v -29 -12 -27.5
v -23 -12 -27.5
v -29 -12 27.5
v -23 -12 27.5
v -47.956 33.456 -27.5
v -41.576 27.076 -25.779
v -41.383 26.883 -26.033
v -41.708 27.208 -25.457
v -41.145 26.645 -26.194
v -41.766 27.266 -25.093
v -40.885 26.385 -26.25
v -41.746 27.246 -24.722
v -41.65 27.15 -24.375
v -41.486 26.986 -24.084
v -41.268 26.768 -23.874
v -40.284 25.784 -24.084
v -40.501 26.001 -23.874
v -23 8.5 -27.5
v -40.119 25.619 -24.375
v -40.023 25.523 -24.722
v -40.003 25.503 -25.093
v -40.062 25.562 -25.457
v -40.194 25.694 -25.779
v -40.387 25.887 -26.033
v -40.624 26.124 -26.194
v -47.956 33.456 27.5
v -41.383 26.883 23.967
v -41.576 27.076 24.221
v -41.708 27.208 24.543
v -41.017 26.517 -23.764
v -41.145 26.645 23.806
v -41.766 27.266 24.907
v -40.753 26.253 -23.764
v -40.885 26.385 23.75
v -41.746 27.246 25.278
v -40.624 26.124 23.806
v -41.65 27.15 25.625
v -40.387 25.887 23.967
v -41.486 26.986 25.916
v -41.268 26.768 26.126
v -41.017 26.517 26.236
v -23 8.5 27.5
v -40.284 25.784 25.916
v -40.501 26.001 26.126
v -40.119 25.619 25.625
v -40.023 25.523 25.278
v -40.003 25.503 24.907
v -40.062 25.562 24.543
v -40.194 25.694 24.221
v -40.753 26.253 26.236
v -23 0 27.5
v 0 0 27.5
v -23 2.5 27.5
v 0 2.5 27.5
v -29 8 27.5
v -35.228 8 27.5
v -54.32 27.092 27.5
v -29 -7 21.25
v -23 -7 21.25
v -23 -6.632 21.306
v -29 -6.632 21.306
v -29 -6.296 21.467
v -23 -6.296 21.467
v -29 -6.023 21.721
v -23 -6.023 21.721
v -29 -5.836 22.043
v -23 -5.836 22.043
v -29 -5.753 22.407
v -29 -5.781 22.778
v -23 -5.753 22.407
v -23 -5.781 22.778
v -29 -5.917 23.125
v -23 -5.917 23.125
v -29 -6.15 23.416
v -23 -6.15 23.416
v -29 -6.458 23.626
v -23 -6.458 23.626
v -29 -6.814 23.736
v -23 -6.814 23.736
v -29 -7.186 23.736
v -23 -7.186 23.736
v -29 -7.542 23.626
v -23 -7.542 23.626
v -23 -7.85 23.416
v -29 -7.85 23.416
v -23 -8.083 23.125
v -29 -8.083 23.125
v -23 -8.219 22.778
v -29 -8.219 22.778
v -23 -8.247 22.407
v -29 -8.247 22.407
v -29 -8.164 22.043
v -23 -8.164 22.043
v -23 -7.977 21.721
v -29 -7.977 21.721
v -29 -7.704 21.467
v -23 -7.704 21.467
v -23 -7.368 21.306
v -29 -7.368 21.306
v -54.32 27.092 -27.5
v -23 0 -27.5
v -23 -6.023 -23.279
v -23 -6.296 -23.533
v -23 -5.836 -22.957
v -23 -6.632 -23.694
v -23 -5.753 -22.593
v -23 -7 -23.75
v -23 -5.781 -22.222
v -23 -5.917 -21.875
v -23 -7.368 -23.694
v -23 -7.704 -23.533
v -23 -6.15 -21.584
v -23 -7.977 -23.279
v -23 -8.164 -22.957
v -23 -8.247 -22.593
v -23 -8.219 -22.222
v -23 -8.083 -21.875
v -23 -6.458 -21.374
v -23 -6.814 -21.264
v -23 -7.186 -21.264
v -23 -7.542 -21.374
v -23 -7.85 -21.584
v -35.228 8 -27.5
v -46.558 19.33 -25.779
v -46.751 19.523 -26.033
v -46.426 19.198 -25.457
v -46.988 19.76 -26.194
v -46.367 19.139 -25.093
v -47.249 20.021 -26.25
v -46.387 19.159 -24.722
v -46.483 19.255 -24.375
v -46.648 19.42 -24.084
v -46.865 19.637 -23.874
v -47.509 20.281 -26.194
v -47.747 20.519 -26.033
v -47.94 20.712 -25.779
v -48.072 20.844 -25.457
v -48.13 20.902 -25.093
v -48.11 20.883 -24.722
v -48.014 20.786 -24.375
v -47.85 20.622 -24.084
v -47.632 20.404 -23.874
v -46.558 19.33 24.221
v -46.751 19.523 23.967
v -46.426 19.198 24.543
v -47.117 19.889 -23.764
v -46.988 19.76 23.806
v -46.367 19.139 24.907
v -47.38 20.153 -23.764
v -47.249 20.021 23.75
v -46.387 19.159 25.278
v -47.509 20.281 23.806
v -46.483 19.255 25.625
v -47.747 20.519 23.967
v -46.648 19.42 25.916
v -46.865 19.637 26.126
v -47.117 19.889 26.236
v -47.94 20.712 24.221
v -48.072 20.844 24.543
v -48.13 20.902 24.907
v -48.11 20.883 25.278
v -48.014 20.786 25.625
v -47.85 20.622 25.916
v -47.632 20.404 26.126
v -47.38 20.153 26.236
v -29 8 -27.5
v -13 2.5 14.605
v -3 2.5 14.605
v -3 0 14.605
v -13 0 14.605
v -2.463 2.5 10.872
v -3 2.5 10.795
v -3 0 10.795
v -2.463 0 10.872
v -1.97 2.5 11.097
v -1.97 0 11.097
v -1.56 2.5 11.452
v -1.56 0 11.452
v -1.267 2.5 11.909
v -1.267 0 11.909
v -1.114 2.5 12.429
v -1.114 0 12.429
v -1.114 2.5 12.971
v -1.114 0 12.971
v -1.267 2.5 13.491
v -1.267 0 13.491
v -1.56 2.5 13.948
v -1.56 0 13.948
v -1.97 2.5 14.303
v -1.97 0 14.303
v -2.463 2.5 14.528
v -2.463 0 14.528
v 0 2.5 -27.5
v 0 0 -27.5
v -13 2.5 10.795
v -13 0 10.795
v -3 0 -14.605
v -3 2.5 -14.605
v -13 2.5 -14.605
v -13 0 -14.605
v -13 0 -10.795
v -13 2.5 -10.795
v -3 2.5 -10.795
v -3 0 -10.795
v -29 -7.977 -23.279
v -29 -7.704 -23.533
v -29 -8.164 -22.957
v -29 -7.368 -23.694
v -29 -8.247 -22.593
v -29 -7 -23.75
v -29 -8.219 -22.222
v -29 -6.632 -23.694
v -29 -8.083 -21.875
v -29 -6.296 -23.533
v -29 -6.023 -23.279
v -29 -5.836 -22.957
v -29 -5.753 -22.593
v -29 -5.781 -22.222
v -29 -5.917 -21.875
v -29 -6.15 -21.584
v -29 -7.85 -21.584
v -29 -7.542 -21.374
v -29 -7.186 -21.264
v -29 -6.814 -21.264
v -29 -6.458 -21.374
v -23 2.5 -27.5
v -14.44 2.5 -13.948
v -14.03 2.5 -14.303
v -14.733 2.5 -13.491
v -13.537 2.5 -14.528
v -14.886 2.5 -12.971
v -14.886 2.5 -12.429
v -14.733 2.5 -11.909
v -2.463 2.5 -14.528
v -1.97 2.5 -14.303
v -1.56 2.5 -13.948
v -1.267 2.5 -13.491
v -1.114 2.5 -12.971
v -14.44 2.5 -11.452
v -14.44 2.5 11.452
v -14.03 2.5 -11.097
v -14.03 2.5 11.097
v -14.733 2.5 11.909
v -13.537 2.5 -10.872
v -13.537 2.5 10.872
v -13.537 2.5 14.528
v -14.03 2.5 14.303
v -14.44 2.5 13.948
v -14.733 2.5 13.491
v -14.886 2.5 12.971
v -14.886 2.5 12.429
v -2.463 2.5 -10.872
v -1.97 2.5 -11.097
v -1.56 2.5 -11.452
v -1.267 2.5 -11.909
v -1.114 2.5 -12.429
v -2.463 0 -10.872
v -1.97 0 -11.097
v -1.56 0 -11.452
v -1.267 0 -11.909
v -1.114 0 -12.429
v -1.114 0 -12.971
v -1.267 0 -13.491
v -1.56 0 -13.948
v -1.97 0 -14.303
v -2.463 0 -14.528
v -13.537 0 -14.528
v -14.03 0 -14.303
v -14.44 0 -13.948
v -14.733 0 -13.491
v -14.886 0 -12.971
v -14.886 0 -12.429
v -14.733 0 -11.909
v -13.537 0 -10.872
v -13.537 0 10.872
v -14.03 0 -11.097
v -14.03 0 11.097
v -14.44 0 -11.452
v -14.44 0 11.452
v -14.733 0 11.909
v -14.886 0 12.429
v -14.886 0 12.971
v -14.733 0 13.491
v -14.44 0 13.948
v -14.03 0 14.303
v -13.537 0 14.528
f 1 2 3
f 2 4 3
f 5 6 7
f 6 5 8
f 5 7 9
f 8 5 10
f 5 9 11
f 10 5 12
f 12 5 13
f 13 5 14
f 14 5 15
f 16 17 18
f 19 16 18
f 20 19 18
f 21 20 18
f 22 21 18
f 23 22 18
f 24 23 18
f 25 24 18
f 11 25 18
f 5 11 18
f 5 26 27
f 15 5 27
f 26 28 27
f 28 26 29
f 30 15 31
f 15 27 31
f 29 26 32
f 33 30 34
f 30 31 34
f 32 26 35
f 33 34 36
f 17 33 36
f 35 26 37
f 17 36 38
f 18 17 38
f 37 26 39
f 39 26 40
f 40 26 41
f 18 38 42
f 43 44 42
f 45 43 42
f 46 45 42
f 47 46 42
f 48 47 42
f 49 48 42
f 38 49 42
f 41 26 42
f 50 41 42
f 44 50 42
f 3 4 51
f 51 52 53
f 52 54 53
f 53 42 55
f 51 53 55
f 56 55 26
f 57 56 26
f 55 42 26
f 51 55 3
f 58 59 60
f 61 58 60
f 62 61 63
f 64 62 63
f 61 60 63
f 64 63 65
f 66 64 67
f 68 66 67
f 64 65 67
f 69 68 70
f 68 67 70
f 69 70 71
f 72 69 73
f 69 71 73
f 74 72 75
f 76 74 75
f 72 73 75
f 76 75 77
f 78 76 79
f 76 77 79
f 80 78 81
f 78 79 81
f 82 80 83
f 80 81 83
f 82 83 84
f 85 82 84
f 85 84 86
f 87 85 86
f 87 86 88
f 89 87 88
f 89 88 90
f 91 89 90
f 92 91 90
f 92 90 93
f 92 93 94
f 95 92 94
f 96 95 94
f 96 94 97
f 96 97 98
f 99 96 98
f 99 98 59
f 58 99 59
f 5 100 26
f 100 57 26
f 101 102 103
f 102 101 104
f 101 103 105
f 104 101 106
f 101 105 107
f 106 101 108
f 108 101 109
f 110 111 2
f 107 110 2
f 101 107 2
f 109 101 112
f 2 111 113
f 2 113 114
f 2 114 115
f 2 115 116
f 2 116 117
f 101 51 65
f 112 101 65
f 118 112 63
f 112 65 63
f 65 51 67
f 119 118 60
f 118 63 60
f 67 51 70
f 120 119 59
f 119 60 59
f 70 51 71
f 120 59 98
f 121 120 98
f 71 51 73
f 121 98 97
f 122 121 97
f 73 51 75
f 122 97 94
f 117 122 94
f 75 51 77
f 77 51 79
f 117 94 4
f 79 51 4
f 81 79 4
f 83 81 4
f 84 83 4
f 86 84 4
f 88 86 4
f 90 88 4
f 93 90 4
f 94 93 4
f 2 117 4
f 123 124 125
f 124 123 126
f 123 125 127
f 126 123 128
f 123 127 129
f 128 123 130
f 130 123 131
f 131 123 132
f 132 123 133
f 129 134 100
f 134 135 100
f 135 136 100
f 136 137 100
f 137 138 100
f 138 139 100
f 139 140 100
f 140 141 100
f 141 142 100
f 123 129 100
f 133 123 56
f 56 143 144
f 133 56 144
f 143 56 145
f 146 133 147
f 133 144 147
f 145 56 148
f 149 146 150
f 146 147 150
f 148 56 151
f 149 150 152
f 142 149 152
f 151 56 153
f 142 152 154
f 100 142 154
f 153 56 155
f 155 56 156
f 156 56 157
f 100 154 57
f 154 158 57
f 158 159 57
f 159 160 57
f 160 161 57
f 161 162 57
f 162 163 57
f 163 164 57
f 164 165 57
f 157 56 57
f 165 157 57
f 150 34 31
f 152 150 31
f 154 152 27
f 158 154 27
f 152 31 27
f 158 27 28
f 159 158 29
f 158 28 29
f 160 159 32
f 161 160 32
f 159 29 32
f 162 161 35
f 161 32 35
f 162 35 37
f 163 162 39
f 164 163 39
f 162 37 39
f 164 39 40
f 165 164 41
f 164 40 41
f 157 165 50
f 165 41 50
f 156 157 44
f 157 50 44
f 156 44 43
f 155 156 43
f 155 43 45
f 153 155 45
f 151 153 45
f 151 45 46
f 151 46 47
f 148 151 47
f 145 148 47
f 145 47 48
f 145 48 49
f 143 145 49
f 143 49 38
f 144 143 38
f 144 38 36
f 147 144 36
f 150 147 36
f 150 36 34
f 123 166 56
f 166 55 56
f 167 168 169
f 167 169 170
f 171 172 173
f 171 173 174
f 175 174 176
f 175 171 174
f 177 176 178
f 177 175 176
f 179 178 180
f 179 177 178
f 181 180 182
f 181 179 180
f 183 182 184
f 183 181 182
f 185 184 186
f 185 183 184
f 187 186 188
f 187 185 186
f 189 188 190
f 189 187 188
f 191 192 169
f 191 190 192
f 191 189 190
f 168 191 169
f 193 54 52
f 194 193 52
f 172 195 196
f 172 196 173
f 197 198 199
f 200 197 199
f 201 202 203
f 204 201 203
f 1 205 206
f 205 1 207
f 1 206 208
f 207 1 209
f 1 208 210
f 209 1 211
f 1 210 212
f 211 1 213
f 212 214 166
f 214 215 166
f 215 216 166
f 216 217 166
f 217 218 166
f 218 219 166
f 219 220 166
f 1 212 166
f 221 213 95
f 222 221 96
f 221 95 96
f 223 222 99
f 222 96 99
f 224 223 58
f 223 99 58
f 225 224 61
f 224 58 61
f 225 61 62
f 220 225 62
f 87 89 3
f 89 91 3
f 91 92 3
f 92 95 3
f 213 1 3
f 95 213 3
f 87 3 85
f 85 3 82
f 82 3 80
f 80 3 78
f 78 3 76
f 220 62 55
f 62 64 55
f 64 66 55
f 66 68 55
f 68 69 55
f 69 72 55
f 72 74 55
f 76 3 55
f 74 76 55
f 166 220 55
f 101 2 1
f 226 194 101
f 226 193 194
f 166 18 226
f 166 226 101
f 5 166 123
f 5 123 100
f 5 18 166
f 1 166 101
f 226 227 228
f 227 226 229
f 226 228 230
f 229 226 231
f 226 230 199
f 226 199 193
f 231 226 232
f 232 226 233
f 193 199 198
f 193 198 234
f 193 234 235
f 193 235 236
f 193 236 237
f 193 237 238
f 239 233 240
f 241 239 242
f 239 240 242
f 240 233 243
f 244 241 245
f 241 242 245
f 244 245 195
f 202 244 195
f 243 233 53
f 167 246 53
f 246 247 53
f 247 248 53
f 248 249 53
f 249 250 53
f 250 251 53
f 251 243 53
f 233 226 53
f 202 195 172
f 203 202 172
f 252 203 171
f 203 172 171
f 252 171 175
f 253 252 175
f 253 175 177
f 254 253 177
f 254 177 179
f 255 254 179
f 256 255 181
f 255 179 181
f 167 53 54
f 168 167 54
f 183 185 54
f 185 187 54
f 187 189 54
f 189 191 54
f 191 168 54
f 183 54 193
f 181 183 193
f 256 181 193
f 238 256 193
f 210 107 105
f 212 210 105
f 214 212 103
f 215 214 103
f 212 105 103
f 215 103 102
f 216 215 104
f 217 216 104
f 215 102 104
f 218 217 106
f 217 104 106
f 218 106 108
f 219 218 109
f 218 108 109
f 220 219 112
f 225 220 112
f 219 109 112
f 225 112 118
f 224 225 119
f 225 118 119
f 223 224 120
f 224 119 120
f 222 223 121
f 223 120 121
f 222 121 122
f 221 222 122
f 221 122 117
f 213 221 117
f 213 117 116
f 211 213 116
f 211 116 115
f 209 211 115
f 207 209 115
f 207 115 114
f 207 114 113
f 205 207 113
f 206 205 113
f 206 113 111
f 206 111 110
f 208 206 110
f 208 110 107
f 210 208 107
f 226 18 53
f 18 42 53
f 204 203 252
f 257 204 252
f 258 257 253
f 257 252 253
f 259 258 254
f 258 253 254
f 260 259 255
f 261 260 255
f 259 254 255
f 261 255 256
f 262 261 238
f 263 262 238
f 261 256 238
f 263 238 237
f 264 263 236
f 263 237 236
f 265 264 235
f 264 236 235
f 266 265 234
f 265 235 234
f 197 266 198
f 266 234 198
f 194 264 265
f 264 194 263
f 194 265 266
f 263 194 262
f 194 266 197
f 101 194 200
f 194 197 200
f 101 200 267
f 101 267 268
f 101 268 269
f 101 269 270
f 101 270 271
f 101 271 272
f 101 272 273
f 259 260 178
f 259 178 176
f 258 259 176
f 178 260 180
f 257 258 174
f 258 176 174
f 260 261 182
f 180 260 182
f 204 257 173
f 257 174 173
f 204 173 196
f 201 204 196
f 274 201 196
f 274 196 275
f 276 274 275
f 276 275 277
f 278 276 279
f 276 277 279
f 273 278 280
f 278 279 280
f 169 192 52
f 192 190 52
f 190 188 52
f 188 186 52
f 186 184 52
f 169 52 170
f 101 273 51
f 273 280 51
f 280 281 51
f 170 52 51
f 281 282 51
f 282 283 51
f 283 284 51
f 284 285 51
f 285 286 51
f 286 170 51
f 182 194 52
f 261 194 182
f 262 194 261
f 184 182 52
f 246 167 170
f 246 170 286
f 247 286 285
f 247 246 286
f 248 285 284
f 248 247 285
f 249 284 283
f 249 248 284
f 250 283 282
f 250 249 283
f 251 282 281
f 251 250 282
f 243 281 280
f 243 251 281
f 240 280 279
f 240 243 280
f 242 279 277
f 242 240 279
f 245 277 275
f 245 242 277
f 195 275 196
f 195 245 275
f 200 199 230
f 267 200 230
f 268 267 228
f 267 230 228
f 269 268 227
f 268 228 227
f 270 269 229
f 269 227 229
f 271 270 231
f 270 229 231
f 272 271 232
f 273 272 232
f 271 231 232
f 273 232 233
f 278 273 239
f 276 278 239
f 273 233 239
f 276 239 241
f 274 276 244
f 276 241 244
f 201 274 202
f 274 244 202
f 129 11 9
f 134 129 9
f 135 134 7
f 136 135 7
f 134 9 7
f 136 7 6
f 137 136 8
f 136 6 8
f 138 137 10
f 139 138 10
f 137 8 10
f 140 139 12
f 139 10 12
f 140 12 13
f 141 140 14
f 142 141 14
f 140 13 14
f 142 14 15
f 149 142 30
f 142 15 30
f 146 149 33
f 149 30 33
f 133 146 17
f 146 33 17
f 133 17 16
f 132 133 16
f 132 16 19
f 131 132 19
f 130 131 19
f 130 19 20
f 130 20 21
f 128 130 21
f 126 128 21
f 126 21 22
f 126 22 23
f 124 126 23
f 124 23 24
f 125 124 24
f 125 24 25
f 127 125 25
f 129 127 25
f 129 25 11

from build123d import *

# Parameters (mm, degrees)
BOSS_EXTRUDE1_DEPTH = 27.5
CUT_EXTRUDE2_REACH  = 16.5
CUT_EXTRUDE3_REACH  = 33.32
SKETCH4_R           = 1.25
CUT_EXTRUDE4_REACH  = 38.642
SKETCH5_R           = 1.25


with BuildPart() as part:
    # Sketch1 → Boss-Extrude1 (new body, symmetric)
    with BuildSketch(Plane.XY):
        Polygon((0, 0), (-23, 0), (-23, -12), (-29, -12), (-29, 8), (-35.227922061, 8), (-54.319805153, 27.091883092), (-47.955844123, 33.455844123), (-23, 8.5), (-23, 2.5), (0, 2.5), align=None)
    extrude(amount=BOSS_EXTRUDE1_DEPTH, both=True)

    # Sketch3 → Cut-Extrude2 (cut, up to next)
    with BuildSketch(Plane(origin=(0, 2.5, 0), x_dir=(1, 0, 0), z_dir=(0, 1, 0)), mode=Mode.PRIVATE) as cut_extrude2_sk1:
        with BuildLine():
            Line((-13, -10.795), (-3, -10.795))
            ThreePointArc((-3, -10.795), (-1.095, -12.7), (-3, -14.605))
            Line((-3, -14.605), (-13, -14.605))
            ThreePointArc((-13, -14.605), (-14.905, -12.7), (-13, -10.795))
        make_face()
    cut_extrude2_tool1 = extrude(cut_extrude2_sk1.sketch, amount=-CUT_EXTRUDE2_REACH, mode=Mode.PRIVATE) & part.part
    add(cut_extrude2_tool1.solids().sort_by_distance((-8, 2.5, 12.7))[0], mode=Mode.SUBTRACT)
    # Sketch3 → Cut-Extrude2 (cut, up to next)
    with BuildSketch(Plane(origin=(0, 2.5, 0), x_dir=(1, 0, 0), z_dir=(0, 1, 0)), mode=Mode.PRIVATE) as cut_extrude2_sk2:
        with BuildLine():
            Line((-13, 10.795), (-3, 10.795))
            ThreePointArc((-3, 10.795), (-1.095, 12.7), (-3, 14.605))
            Line((-3, 14.605), (-13, 14.605))
            ThreePointArc((-13, 14.605), (-14.905, 12.7), (-13, 10.795))
        make_face()
    cut_extrude2_tool2 = extrude(cut_extrude2_sk2.sketch, amount=-CUT_EXTRUDE2_REACH, mode=Mode.PRIVATE) & part.part
    add(cut_extrude2_tool2.solids().sort_by_distance((-8, 2.5, -12.7))[0], mode=Mode.SUBTRACT)

    # Sketch4 → Cut-Extrude3 (cut, up to next)
    with BuildSketch(Plane(origin=(-23, 0, 0), x_dir=(0, 0, -1), z_dir=(1, 0, 0)), mode=Mode.PRIVATE) as cut_extrude3_sk1:
        with Locations((-22.5, -7)):
            Circle(SKETCH4_R)
    cut_extrude3_tool1 = extrude(cut_extrude3_sk1.sketch, amount=-CUT_EXTRUDE3_REACH, mode=Mode.PRIVATE) & part.part
    add(cut_extrude3_tool1.solids().sort_by_distance((-23, -7, 22.5))[0], mode=Mode.SUBTRACT)
    # Sketch4 → Cut-Extrude3 (cut, up to next)
    with BuildSketch(Plane(origin=(-23, 0, 0), x_dir=(0, 0, -1), z_dir=(1, 0, 0)), mode=Mode.PRIVATE) as cut_extrude3_sk2:
        with Locations((22.5, -7)):
            Circle(SKETCH4_R)
    cut_extrude3_tool2 = extrude(cut_extrude3_sk2.sketch, amount=-CUT_EXTRUDE3_REACH, mode=Mode.PRIVATE) & part.part
    add(cut_extrude3_tool2.solids().sort_by_distance((-23, -7, -22.5))[0], mode=Mode.SUBTRACT)

    # Sketch5 → Cut-Extrude4 (cut, up to next)
    with BuildSketch(Plane(origin=(-7.25, -7.25, 0), x_dir=(0, 0, -1), z_dir=(0.707106781, 0.707106781, 0)), mode=Mode.PRIVATE) as cut_extrude4_sk1:
        with Locations((-25, 47.566756826)):
            Circle(SKETCH5_R)
    cut_extrude4_tool1 = extrude(cut_extrude4_sk1.sketch, amount=-CUT_EXTRUDE4_REACH, mode=Mode.PRIVATE) & part.part
    add(cut_extrude4_tool1.solids().sort_by_distance((-40.884776, 26.384776, 25))[0], mode=Mode.SUBTRACT)
    # Sketch5 → Cut-Extrude4 (cut, up to next)
    with BuildSketch(Plane(origin=(-7.25, -7.25, 0), x_dir=(0, 0, -1), z_dir=(0.707106781, 0.707106781, 0)), mode=Mode.PRIVATE) as cut_extrude4_sk2:
        with Locations((25, 47.566756826)):
            Circle(SKETCH5_R)
    cut_extrude4_tool2 = extrude(cut_extrude4_sk2.sketch, amount=-CUT_EXTRUDE4_REACH, mode=Mode.PRIVATE) & part.part
    add(cut_extrude4_tool2.solids().sort_by_distance((-40.884776, 26.384776, -25))[0], mode=Mode.SUBTRACT)


solid = part.part
